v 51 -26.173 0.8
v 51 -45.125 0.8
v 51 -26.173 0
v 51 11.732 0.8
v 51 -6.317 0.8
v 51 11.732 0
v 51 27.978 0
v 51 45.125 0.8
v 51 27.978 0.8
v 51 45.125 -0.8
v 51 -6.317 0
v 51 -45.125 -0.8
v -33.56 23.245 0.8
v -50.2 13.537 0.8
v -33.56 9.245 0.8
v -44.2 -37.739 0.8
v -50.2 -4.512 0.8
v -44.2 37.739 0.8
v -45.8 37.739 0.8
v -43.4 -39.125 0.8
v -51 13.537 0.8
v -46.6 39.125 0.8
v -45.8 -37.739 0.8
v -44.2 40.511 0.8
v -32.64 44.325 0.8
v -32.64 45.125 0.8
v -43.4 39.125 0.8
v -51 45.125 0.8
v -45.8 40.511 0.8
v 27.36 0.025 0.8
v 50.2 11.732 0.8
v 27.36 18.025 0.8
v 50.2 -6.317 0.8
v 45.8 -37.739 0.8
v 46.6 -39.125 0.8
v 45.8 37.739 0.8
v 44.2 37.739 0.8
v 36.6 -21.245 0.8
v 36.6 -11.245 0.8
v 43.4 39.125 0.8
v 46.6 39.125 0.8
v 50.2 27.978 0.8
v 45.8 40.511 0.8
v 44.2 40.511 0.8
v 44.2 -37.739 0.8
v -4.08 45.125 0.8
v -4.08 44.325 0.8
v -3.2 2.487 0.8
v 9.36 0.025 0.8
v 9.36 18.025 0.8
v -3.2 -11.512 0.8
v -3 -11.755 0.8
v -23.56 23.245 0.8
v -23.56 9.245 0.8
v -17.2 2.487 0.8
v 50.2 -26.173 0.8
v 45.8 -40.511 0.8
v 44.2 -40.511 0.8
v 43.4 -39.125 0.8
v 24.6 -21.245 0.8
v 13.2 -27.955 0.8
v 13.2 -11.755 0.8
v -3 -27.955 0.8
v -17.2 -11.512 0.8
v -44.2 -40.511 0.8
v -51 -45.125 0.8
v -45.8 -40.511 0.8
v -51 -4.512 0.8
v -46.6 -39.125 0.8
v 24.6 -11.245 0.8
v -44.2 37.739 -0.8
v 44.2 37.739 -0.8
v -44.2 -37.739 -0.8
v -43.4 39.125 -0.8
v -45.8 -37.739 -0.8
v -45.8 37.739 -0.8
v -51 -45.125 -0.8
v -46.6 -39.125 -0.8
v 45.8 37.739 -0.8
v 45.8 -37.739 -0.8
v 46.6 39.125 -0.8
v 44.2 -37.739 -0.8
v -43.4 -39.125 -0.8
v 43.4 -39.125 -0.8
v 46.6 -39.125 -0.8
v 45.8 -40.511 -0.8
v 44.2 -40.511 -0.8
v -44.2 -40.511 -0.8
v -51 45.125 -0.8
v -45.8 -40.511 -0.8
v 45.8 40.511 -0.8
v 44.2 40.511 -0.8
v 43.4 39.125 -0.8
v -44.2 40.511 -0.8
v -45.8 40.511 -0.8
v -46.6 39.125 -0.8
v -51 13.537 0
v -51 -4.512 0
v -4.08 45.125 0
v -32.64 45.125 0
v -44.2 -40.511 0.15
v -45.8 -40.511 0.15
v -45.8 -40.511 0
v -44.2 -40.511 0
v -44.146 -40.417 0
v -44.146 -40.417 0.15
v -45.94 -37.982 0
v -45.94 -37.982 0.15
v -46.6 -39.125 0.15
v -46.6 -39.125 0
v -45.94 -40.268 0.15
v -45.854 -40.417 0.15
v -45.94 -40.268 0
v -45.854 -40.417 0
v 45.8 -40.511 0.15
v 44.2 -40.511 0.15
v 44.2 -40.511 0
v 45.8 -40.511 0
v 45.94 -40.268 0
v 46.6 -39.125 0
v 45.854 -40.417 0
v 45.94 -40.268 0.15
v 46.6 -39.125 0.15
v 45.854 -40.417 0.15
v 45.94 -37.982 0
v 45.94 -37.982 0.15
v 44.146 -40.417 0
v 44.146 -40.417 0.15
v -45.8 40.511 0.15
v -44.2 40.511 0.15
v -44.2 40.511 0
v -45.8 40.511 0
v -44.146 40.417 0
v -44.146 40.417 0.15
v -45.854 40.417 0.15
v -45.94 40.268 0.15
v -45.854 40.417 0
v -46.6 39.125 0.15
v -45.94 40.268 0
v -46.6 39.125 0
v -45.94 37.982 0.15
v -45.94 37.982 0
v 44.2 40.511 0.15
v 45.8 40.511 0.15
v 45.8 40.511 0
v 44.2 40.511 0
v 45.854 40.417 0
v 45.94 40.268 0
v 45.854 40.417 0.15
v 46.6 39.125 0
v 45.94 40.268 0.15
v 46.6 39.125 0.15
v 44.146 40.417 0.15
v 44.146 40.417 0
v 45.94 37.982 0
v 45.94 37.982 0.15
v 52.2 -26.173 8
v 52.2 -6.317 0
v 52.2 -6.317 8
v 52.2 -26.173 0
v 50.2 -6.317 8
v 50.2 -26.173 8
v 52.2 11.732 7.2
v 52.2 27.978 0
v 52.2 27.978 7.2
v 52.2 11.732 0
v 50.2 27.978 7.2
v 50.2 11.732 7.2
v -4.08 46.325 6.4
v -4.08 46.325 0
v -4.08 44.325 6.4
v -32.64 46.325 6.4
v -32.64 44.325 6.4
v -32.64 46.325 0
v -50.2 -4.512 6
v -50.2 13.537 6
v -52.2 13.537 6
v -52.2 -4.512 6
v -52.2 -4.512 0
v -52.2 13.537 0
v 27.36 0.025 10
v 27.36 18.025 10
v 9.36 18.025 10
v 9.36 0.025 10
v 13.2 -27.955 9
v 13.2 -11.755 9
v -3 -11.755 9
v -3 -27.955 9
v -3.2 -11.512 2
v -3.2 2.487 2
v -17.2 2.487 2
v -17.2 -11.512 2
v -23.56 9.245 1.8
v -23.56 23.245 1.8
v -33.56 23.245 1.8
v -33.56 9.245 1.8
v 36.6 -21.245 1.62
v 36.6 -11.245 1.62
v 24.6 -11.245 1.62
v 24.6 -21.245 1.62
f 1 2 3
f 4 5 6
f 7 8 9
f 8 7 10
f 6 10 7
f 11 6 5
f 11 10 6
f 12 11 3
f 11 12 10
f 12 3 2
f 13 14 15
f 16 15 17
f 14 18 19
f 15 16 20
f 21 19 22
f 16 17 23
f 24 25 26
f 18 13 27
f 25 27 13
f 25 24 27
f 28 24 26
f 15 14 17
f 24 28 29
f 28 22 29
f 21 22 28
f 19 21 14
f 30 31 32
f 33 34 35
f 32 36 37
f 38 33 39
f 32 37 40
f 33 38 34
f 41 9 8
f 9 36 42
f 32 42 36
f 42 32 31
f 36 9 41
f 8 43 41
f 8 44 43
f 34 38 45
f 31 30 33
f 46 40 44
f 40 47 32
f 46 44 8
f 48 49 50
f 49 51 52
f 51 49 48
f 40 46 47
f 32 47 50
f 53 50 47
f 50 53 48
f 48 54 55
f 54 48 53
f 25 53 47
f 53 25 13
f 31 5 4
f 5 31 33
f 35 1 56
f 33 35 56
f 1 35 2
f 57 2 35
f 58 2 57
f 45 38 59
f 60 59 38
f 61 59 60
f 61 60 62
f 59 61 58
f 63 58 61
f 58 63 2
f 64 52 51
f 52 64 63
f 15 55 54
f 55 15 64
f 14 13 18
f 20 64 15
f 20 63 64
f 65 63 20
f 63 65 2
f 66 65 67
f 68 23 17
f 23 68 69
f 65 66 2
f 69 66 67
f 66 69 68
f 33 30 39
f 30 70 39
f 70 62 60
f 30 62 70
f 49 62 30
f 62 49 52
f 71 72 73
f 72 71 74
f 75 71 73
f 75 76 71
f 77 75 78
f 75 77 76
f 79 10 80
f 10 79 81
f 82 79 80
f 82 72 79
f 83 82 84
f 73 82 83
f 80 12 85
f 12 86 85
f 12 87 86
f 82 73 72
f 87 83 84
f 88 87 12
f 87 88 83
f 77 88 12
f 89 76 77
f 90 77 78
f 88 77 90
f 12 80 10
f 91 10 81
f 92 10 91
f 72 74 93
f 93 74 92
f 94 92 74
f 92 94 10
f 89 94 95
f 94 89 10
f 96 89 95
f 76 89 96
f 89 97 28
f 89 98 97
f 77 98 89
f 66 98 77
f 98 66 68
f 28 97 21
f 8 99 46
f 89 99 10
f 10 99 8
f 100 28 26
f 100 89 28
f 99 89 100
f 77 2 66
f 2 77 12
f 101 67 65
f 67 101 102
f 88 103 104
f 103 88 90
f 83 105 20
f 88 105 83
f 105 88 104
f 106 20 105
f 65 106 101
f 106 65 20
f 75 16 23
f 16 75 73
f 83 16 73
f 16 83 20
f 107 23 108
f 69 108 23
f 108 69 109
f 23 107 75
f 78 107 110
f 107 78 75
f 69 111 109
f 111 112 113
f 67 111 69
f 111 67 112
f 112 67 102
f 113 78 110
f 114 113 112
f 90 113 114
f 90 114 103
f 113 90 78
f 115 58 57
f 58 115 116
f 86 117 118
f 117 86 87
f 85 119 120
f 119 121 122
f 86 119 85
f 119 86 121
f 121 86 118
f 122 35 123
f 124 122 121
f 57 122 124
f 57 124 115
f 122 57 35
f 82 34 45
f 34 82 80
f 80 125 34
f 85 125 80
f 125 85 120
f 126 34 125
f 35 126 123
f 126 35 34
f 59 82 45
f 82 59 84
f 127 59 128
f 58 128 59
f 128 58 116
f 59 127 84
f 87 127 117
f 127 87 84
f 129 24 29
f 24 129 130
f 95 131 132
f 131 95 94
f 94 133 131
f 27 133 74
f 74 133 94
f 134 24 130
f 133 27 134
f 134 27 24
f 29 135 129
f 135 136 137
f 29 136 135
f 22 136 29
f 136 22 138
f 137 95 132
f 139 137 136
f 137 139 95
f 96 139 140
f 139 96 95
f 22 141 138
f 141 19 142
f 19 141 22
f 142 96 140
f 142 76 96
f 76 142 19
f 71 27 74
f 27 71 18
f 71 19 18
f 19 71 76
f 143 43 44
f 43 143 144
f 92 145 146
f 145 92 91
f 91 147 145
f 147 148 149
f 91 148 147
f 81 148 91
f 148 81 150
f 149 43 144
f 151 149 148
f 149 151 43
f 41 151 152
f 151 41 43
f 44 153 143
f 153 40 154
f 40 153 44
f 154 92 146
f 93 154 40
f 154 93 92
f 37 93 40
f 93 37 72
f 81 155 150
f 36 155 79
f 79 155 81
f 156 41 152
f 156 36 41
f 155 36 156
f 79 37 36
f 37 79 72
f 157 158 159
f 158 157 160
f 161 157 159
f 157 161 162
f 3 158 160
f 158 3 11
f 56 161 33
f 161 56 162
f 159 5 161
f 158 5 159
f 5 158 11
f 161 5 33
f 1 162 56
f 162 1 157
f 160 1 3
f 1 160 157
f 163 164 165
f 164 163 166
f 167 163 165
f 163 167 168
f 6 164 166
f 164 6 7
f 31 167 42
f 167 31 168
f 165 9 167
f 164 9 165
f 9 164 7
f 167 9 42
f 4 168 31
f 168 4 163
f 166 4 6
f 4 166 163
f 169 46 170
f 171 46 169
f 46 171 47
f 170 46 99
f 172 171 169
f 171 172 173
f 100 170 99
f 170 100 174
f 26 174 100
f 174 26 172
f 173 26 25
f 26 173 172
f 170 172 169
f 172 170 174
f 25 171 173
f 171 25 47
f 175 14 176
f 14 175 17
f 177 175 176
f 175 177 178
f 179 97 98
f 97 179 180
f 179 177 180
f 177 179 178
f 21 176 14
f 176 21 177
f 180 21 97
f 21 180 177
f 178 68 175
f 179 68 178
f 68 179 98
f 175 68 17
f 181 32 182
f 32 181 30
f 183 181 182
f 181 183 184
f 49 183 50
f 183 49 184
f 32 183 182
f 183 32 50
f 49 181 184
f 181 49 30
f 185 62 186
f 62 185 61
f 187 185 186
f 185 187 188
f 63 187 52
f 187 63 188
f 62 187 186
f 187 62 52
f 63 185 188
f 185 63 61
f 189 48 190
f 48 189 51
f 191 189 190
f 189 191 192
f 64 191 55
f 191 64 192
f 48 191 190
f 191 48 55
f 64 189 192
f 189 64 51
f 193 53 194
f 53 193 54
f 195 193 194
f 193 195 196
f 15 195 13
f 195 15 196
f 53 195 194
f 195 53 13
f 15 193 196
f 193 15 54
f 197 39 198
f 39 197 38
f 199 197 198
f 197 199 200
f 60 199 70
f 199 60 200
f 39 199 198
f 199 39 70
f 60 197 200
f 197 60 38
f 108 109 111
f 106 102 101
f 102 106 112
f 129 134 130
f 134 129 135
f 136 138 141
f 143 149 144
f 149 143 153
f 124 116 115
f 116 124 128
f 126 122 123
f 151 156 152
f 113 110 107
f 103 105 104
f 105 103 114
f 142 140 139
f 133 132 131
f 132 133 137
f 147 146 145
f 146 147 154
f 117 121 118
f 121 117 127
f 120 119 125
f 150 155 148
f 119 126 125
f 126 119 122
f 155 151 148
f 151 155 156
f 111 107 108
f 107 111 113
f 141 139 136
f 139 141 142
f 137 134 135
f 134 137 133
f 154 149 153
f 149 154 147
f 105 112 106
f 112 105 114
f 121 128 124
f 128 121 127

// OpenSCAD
// Parameters
pcb_L = 102.0; //[51.0:204.0:0.25]
pcb_W = 90.25; //[45.0:180.5:0.25]
pcb_T = 1.6; //[0.8:3.2:0.1]
overlap = 0.8; //[0.5:2.0:0.1]
mount_hole_d = 3.2; //[2.0:6.0:0.1]
mount_edge_x = 6.0; //[3.0:15.0:0.5]
mount_edge_y = 6.0; //[3.0:15.0:0.5]
conn_T = 8.0; //[4.0:16.0:0.5]
conn_depth = 12.0; //[6.0:24.0:0.5]
conn_wall = 2.0; //[1.0:4.0:0.25]
heatsink_L = 18.0; //[9.0:36.0:0.5]
heatsink_W = 18.0; //[9.0:36.0:0.5]
heatsink_H = 10.0; //[5.0:20.0:0.5]
ic1_L = 14.0; //[7.0:28.0:0.5]
ic1_W = 14.0; //[7.0:28.0:0.5]
ic1_H = 2.0; //[1.0:5.0:0.1]
ic2_L = 10.0; //[5.0:20.0:0.5]
ic2_W = 10.0; //[5.0:20.0:0.5]
ic2_H = 1.8; //[0.9:4.0:0.1]
silk_T = 0.15; //[0.05:0.4:0.05]
silk_margin = 2.0; //[1.0:6.0:0.5]

// Mainboard PCB with mounting holes
module pcb_with_holes() {
  difference() {
    color([0.0, 0.4, 0.2]) // PCB color
    cube([pcb_L, pcb_W, pcb_T], center=true);
    translate([-pcb_L/2 + mount_edge_x, -pcb_W/2 + mount_edge_y, 0])
      cylinder(h=pcb_T + 2*overlap, r=mount_hole_d/2, center=true);
    translate([pcb_L/2 - mount_edge_x, -pcb_W/2 + mount_edge_y, 0])
      cylinder(h=pcb_T + 2*overlap, r=mount_hole_d/2, center=true);
    translate([-pcb_L/2 + mount_edge_x, pcb_W/2 - mount_edge_y, 0])
      cylinder(h=pcb_T + 2*overlap, r=mount_hole_d/2, center=true);
    translate([pcb_L/2 - mount_edge_x, pcb_W/2 - mount_edge_y, 0])
      cylinder(h=pcb_T + 2*overlap, r=mount_hole_d/2, center=true);
  }
}

// Connectors
module connectors() {
  union() {
    color([0.15, 0.15, 0.15]) // Connector color
    translate([pcb_L/2 + conn_wall/2 - overlap, -pcb_W*0.18, pcb_T/2 + conn_T/2 - overlap])
      cube([conn_wall, pcb_W*0.22, conn_T], center=true);
    translate([pcb_L/2 + conn_wall/2 - overlap, pcb_W*0.22, pcb_T/2 + (conn_T*0.9)/2 - overlap])
      cube([conn_wall, pcb_W*0.18, conn_T*0.9], center=true);
    translate([-pcb_L*0.18, pcb_W/2 + conn_wall/2 - overlap, pcb_T/2 + (conn_T*0.8)/2 - overlap])
      cube([pcb_L*0.28, conn_wall, conn_T*0.8], center=true);
    translate([-pcb_L/2 - conn_wall/2 + overlap, pcb_W*0.05, pcb_T/2 + (conn_T*0.75)/2 - overlap])
      cube([conn_wall, pcb_W*0.20, conn_T*0.75], center=true);
  }
}

// Heatsinks
module heatsinks() {
  union() {
    color([0.75, 0.75, 0.77]) // Heatsink color
    translate([pcb_L*0.18, pcb_W*0.10, pcb_T/2 + heatsink_H/2 - overlap])
      cube([heatsink_L, heatsink_W, heatsink_H], center=true);
    translate([pcb_L*0.05, -pcb_W*0.22, pcb_T/2 + (heatsink_H*0.9)/2 - overlap])
      cube([heatsink_L*0.9, heatsink_W*0.9, heatsink_H*0.9], center=true);
  }
}

// IC Packages
module ic_packages() {
  union() {
    color([0.1, 0.1, 0.1]) // IC package color
    translate([-pcb_L*0.10, -pcb_W*0.05, pcb_T/2 + ic1_H/2 - overlap])
      cube([ic1_L, ic1_W, ic1_H], center=true);
    translate([-pcb_L*0.28, pcb_W*0.18, pcb_T/2 + ic2_H/2 - overlap])
      cube([ic2_L, ic2_W*1.4, ic2_H], center=true);
    translate([pcb_L*0.30, -pcb_W*0.18, pcb_T/2 + (ic2_H*0.9)/2 - overlap])
      cube([ic2_L*1.2, ic2_W, ic2_H*0.9], center=true);
  }
}

// Silkscreen Markings
module silkscreen_markings() {
  difference() {
    color([1, 1, 1]) // Silkscreen color
    translate([0, 0, pcb_T/2 + silk_T/2 - overlap])
      cube([pcb_L - 2*silk_margin, pcb_W - 2*silk_margin, silk_T], center=true);
    translate([0, 0, pcb_T/2 + silk_T/2 - overlap])
      cube([pcb_L - 2*(silk_margin + pcb_L*0.03), pcb_W - 2*(silk_margin + pcb_W*0.03), silk_T + 2*overlap], center=true);
  }
  translate([-pcb_L*0.22, -pcb_W*0.30, pcb_T/2 + silk_T/2 - overlap])
    cube([pcb_L*0.18, pcb_W*0.03, silk_T], center=true);
  translate([pcb_L*0.20, pcb_W*0.30, pcb_T/2 + silk_T/2 - overlap])
    cube([pcb_L*0.10, pcb_W*0.03, silk_T], center=true);
}

// Mainboard Complete
module mainboard_complete() {
  union() {
    pcb_with_holes();
    connectors();
    heatsinks();
    ic_packages();
    silkscreen_markings();
  }
}

// Render the complete mainboard
mainboard_complete();
